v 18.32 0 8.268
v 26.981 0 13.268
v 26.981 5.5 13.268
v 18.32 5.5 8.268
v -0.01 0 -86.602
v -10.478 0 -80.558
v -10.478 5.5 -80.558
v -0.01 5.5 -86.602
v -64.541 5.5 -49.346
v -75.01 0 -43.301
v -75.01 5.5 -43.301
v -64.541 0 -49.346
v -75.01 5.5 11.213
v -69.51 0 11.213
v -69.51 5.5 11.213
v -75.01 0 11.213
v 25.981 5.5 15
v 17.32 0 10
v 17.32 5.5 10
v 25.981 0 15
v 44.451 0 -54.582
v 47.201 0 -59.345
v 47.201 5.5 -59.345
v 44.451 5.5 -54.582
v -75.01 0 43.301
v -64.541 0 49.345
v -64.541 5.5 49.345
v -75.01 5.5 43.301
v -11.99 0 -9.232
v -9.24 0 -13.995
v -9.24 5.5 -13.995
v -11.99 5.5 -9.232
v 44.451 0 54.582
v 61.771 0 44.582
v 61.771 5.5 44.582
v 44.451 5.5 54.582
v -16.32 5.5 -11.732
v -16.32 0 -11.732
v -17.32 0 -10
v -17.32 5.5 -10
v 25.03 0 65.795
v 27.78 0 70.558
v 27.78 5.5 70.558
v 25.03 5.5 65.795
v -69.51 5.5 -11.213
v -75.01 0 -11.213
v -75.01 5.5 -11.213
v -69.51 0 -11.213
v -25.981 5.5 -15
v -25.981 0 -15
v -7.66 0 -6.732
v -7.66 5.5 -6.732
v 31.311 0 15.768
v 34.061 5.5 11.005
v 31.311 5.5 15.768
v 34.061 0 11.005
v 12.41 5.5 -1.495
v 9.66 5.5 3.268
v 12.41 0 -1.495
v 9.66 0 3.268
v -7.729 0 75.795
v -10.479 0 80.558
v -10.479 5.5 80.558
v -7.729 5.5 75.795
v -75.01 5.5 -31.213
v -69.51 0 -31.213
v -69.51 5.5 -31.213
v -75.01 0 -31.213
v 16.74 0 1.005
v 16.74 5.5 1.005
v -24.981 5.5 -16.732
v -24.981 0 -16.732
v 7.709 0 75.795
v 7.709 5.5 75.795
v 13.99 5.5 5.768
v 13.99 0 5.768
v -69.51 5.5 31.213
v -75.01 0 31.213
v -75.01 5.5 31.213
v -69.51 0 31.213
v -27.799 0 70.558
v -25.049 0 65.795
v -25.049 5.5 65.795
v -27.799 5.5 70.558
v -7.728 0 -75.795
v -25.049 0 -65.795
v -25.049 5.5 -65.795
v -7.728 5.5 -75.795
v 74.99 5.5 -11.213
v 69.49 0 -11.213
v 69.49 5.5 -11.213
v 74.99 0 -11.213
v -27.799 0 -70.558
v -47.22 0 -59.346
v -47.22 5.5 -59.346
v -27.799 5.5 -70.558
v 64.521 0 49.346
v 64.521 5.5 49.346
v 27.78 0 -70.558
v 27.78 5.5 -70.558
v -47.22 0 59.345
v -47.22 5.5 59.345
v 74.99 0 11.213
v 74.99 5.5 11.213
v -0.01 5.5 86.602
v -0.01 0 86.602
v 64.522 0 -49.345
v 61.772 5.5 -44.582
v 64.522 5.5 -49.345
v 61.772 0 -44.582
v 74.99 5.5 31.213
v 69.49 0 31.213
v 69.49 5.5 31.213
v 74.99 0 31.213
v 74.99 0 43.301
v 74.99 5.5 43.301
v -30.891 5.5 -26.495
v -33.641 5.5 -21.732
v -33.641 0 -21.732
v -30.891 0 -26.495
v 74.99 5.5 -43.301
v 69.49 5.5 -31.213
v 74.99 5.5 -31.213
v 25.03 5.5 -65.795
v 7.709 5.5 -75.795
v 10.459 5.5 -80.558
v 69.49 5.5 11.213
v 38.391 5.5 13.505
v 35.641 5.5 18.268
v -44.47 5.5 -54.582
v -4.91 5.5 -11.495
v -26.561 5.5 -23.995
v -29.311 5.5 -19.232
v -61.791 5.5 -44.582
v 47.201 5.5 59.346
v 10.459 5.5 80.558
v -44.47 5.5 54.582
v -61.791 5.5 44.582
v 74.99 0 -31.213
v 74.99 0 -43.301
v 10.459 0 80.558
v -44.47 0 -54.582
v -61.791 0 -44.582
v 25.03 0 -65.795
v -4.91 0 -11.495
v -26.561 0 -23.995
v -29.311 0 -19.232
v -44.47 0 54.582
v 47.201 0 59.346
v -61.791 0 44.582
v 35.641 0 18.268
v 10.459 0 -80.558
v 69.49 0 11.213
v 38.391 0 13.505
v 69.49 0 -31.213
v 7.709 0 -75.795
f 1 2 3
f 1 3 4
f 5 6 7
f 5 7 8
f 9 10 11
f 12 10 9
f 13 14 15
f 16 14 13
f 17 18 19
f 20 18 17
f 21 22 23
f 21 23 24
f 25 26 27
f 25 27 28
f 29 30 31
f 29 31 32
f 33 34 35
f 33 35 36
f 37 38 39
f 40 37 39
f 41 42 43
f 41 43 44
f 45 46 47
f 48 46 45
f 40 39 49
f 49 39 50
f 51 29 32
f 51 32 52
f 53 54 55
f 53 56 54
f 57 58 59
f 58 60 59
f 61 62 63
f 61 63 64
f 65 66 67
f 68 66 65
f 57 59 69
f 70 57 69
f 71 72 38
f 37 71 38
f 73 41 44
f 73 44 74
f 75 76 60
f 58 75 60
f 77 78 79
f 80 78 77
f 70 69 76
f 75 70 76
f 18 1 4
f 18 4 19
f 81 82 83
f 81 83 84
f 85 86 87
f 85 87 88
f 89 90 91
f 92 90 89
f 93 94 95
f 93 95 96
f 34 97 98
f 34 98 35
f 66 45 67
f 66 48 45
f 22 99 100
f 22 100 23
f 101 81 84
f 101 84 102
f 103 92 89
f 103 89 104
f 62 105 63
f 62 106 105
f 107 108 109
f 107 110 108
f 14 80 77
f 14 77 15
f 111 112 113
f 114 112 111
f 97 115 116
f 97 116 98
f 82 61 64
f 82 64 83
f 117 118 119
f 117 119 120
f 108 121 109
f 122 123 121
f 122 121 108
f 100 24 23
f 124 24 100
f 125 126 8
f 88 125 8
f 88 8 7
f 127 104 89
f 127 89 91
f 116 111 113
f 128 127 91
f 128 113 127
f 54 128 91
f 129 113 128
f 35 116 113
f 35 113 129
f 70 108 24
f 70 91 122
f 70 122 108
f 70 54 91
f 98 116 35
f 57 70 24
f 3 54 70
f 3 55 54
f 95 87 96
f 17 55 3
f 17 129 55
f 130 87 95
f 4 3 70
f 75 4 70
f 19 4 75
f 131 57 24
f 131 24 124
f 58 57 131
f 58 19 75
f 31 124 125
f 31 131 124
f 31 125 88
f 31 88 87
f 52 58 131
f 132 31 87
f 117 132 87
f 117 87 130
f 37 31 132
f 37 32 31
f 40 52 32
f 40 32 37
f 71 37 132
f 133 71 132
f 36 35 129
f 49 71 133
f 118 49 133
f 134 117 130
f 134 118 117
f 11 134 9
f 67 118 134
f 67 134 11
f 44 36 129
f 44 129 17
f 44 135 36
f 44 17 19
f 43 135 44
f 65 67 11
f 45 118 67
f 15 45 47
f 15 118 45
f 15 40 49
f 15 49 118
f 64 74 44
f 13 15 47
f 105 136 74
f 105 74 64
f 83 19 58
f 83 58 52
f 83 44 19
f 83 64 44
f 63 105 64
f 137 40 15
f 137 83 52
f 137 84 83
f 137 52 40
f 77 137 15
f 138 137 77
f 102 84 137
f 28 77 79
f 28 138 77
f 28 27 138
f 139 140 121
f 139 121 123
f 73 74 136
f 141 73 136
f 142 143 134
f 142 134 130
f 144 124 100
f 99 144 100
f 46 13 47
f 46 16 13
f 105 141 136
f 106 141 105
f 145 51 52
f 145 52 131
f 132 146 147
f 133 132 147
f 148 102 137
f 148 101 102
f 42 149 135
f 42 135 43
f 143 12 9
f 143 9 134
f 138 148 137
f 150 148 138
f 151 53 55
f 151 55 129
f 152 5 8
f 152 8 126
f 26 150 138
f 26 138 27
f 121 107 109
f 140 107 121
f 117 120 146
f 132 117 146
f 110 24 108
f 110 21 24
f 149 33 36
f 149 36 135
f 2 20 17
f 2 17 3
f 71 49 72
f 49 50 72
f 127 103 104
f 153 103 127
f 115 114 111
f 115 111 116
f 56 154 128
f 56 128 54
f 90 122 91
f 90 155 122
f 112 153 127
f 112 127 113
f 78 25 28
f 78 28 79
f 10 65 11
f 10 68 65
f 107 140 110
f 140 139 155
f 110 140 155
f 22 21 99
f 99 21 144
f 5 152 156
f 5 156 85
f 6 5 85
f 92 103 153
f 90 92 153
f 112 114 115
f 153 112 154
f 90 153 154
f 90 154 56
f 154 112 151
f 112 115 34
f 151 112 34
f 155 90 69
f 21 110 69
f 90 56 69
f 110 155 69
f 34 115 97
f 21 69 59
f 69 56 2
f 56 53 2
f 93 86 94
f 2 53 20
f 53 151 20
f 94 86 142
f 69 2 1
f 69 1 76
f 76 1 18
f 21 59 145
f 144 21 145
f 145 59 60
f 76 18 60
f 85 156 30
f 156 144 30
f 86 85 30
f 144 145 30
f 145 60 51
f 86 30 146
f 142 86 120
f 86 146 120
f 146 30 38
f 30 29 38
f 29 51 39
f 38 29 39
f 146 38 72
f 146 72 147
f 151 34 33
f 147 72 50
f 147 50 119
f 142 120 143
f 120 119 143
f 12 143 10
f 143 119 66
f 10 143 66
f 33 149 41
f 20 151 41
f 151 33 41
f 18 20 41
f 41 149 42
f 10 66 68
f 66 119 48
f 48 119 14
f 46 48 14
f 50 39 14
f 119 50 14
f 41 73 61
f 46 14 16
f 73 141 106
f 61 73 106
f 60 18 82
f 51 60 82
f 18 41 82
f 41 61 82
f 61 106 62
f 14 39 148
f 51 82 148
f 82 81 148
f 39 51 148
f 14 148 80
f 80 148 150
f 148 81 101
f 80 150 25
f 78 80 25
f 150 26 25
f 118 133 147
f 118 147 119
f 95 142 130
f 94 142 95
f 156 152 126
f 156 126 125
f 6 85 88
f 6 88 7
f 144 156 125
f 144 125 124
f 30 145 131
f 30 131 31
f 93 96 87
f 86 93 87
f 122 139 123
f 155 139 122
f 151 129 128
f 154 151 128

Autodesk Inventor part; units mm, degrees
ref_plane "YZ Plane" through (0, 0, 0) normal (1, 0, 0) x (0, 1, 0)
ref_plane "XZ Plane" through (0, 0, 0) normal (0, 1, 0) x (-1, 0, 0)
ref_plane "XY Plane" through (0, 0, 0) normal (0, 0, 1) x (1, 0, 0)
sketch "Sketch1" plane through (0, 0, 0) normal (0, 1, 0) x (-1, 0, 0)
  line L0 (75.0098, 31.2127) -> (69.5098, 31.2127)
  line L1 (75.0098, 31.2127) -> (80.5098, 31.2127) construction
  line L2 (69.5098, 31.2127) -> (69.5098, 11.2127)
  line L3 (69.5098, 11.2127) -> (75.0098, 11.2127)
  line L4 (75.0098, -11.213) -> (69.5098, -11.213)
  line L5 (69.5098, -11.213) -> (69.5098, -31.213)
  line L6 (69.5098, -31.213) -> (75.0098, -31.213)
  line L7 (75.0098, -31.213) -> (75.0098, -43.3013)
  line L8 (75.0098, 43.3013) -> (75.0098, 31.2127)
  line L9 (75.0098, 11.2127) -> (75.0098, -11.213)
  line L10 (64.5408, -49.3456) -> (61.7908, -44.5824)
  line L11 (64.5408, -49.3456) -> (67.2908, -54.1087) construction
  line L12 (61.7908, -44.5824) -> (44.4702, -54.5824)
  line L13 (44.4702, -54.5824) -> (47.2202, -59.3456)
  line L14 (27.799, -70.5584) -> (25.049, -65.7953)
  line L15 (25.049, -65.7953) -> (7.7285, -75.7953)
  line L16 (7.7285, -75.7953) -> (10.4785, -80.5584)
  line L17 (10.4785, -80.5584) -> (0.0098, -86.6025)
  line L18 (75.0098, -43.3013) -> (64.5408, -49.3456)
  line L19 (47.2202, -59.3456) -> (27.799, -70.5584)
  line L20 (-10.4592, -80.5582) -> (-7.7092, -75.7951)
  line L21 (-10.4592, -80.5582) -> (-13.2092, -85.3214) construction
  line L22 (-7.7092, -75.7951) -> (-25.0298, -65.7951)
  line L23 (-25.0298, -65.7951) -> (-27.7798, -70.5582)
  line L24 (-47.201, -59.3454) -> (-44.451, -54.5823)
  line L25 (-44.451, -54.5823) -> (-61.7715, -44.5823)
  line L26 (-61.7715, -44.5823) -> (-64.5215, -49.3454)
  line L27 (-64.5215, -49.3454) -> (-74.9902, -43.3013)
  line L28 (0.0098, -86.6025) -> (-10.4592, -80.5582)
  line L29 (-27.7798, -70.5582) -> (-47.201, -59.3454)
  line L30 (-74.9902, -31.2127) -> (-69.4902, -31.2127)
  line L31 (-74.9902, -31.2127) -> (-80.4902, -31.2127) construction
  line L32 (-69.4902, -31.2127) -> (-69.4902, -11.2127)
  line L33 (-69.4902, -11.2127) -> (-74.9902, -11.2127)
  line L34 (-74.9902, 11.213) -> (-69.4902, 11.213)
  line L35 (-69.4902, 11.213) -> (-69.4902, 31.213)
  line L36 (-69.4902, 31.213) -> (-74.9902, 31.213)
  line L37 (-74.9902, 31.213) -> (-74.9902, 43.3013)
  line L38 (-74.9902, -43.3013) -> (-74.9902, -31.2127)
  line L39 (-74.9902, -11.2127) -> (-74.9902, 11.213)
  line L40 (-64.5212, 49.3456) -> (-61.7712, 44.5824)
  line L41 (-64.5212, 49.3456) -> (-67.2712, 54.1087) construction
  line L42 (-61.7712, 44.5824) -> (-44.4507, 54.5824)
  line L43 (-44.4507, 54.5824) -> (-47.2007, 59.3456)
  line L44 (-27.7795, 70.5584) -> (-25.0295, 65.7953)
  line L45 (-25.0295, 65.7953) -> (-7.709, 75.7953)
  line L46 (-7.709, 75.7953) -> (-10.459, 80.5584)
  line L47 (-10.459, 80.5584) -> (0.0098, 86.6025)
  line L48 (-74.9902, 43.3013) -> (-64.5212, 49.3456)
  line L49 (-47.2007, 59.3456) -> (-27.7795, 70.5584)
  line L50 (10.4788, 80.5582) -> (7.7288, 75.7951)
  line L51 (10.4788, 80.5582) -> (13.2288, 85.3214) construction
  line L52 (7.7288, 75.7951) -> (25.0493, 65.7951)
  line L53 (25.0493, 65.7951) -> (27.7993, 70.5582)
  line L54 (47.2205, 59.3454) -> (44.4705, 54.5823)
  line L55 (44.4705, 54.5823) -> (61.791, 44.5823)
  line L56 (61.791, 44.5823) -> (64.541, 49.3454)
  line L57 (64.541, 49.3454) -> (75.0098, 43.3013)
  line L58 (0.0098, 86.6025) -> (10.4788, 80.5582)
  line L59 (27.7993, 70.5582) -> (47.2205, 59.3454)
  line L60 (64.541, 49.3454) -> (75.0098, 43.3013)
  line L61 (0.0098, 86.6025) -> (10.4788, 80.5582)
  line L62 (27.7993, 70.5582) -> (47.2205, 59.3454)
  line L63 (-10.459, 80.5584) -> (0.0098, 86.6025)
  line L64 (-74.9902, 43.3013) -> (-64.5212, 49.3456)
  line L65 (-47.2007, 59.3456) -> (-27.7795, 70.5584)
  line L66 (-74.9902, 31.213) -> (-74.9902, 43.3013)
  line L67 (-74.9902, -43.3013) -> (-74.9902, -31.2127)
  line L68 (-74.9902, -11.2127) -> (-74.9902, 11.213)
  line L69 (-64.5215, -49.3454) -> (-74.9902, -43.3013)
  line L70 (0.0098, -86.6025) -> (-10.4592, -80.5582)
  line L71 (-27.7798, -70.5582) -> (-47.201, -59.3454)
  line L72 (10.4785, -80.5584) -> (0.0098, -86.6025)
  line L73 (75.0098, -43.3013) -> (64.5408, -49.3456)
  line L74 (47.2202, -59.3456) -> (27.799, -70.5584)
  point P0 (0.0098, 0)
  point P1 (0.0098, 0)
  point P2 (0.0098, 0)
  point P3 (0.0098, 0)
  point P4 (0.0098, 0)
  point P5 (0.0098, 0)
  dimension "d6" = 86.6025
  dimension "d7" = 5.5
  dimension "d8" = 180
  dimension "d9" = 20
  dimension "d10" = 20
  dimension "d13" = 360
extrude "Extrusion1" add sketch "Sketch1" along normal blind 5.5
sketch "Sketch2" plane through (0, 0, 0) normal (0, -1, 0) x (1, 0, 0)
  line L0 (-17.3205, -10) -> (-25.9808, -15)
  line L1 (-25.9808, -15) -> (-24.9808, -16.7321)
  line L2 (-24.9808, -16.7321) -> (-16.3205, -11.7321)
  line L3 (-16.3205, -11.7321) -> (-17.3205, -10)
  line L4 (17.3205, 10) -> (25.9808, 15)
  line L5 (25.9808, 15) -> (26.9808, 13.2679)
  line L6 (26.9808, 13.2679) -> (18.3205, 8.2679)
  line L7 (18.3205, 8.2679) -> (17.3205, 10)
  point P0 (0, 0)
  dimension "d17" = 10
  dimension "d18" = 2
  dimension "d19" = 10
  dimension "d22" = 20
  dimension "d23" = 20
extrude "Extrusion2" cut sketch "Sketch2" against normal blind 10
sketch "Sketch4" plane through (0, 0, 0) normal (0, -1, 0) x (1, 0, 0)
  line L0 (13.9904, 5.7679) -> (9.6603, 3.2679)
  line L1 (9.6603, 3.2679) -> (12.4103, -1.4952)
  line L2 (12.4103, -1.4952) -> (16.7404, 1.0048)
  line L3 (16.7404, 1.0048) -> (13.9904, 5.7679)
  line L4 (31.3109, 15.7679) -> (35.641, 18.2679)
  line L5 (35.641, 18.2679) -> (38.391, 13.5048)
  line L6 (38.391, 13.5048) -> (34.0609, 11.0048)
  line L7 (34.0609, 11.0048) -> (31.3109, 15.7679)
  line L8 (-11.9904, -9.2321) -> (-7.6603, -6.7321)
  line L9 (-7.6603, -6.7321) -> (-4.9103, -11.4952)
  line L10 (-4.9103, -11.4952) -> (-9.2404, -13.9952)
  line L11 (-9.2404, -13.9952) -> (-11.9904, -9.2321)
  line L12 (-29.3109, -19.2321) -> (-33.641, -21.7321)
  line L13 (-33.641, -21.7321) -> (-30.891, -26.4952)
  line L14 (-30.891, -26.4952) -> (-26.5609, -23.9952)
  line L15 (-26.5609, -23.9952) -> (-29.3109, -19.2321)
  point P0 (0, 0)
  dimension "d24" = 5
  dimension "d25" = 5.5
  dimension "d26" = 5
  dimension "d27" = 5.5
extrude "Extrusion3" cut sketch "Sketch4" against normal blind 10
properties part number "base"
